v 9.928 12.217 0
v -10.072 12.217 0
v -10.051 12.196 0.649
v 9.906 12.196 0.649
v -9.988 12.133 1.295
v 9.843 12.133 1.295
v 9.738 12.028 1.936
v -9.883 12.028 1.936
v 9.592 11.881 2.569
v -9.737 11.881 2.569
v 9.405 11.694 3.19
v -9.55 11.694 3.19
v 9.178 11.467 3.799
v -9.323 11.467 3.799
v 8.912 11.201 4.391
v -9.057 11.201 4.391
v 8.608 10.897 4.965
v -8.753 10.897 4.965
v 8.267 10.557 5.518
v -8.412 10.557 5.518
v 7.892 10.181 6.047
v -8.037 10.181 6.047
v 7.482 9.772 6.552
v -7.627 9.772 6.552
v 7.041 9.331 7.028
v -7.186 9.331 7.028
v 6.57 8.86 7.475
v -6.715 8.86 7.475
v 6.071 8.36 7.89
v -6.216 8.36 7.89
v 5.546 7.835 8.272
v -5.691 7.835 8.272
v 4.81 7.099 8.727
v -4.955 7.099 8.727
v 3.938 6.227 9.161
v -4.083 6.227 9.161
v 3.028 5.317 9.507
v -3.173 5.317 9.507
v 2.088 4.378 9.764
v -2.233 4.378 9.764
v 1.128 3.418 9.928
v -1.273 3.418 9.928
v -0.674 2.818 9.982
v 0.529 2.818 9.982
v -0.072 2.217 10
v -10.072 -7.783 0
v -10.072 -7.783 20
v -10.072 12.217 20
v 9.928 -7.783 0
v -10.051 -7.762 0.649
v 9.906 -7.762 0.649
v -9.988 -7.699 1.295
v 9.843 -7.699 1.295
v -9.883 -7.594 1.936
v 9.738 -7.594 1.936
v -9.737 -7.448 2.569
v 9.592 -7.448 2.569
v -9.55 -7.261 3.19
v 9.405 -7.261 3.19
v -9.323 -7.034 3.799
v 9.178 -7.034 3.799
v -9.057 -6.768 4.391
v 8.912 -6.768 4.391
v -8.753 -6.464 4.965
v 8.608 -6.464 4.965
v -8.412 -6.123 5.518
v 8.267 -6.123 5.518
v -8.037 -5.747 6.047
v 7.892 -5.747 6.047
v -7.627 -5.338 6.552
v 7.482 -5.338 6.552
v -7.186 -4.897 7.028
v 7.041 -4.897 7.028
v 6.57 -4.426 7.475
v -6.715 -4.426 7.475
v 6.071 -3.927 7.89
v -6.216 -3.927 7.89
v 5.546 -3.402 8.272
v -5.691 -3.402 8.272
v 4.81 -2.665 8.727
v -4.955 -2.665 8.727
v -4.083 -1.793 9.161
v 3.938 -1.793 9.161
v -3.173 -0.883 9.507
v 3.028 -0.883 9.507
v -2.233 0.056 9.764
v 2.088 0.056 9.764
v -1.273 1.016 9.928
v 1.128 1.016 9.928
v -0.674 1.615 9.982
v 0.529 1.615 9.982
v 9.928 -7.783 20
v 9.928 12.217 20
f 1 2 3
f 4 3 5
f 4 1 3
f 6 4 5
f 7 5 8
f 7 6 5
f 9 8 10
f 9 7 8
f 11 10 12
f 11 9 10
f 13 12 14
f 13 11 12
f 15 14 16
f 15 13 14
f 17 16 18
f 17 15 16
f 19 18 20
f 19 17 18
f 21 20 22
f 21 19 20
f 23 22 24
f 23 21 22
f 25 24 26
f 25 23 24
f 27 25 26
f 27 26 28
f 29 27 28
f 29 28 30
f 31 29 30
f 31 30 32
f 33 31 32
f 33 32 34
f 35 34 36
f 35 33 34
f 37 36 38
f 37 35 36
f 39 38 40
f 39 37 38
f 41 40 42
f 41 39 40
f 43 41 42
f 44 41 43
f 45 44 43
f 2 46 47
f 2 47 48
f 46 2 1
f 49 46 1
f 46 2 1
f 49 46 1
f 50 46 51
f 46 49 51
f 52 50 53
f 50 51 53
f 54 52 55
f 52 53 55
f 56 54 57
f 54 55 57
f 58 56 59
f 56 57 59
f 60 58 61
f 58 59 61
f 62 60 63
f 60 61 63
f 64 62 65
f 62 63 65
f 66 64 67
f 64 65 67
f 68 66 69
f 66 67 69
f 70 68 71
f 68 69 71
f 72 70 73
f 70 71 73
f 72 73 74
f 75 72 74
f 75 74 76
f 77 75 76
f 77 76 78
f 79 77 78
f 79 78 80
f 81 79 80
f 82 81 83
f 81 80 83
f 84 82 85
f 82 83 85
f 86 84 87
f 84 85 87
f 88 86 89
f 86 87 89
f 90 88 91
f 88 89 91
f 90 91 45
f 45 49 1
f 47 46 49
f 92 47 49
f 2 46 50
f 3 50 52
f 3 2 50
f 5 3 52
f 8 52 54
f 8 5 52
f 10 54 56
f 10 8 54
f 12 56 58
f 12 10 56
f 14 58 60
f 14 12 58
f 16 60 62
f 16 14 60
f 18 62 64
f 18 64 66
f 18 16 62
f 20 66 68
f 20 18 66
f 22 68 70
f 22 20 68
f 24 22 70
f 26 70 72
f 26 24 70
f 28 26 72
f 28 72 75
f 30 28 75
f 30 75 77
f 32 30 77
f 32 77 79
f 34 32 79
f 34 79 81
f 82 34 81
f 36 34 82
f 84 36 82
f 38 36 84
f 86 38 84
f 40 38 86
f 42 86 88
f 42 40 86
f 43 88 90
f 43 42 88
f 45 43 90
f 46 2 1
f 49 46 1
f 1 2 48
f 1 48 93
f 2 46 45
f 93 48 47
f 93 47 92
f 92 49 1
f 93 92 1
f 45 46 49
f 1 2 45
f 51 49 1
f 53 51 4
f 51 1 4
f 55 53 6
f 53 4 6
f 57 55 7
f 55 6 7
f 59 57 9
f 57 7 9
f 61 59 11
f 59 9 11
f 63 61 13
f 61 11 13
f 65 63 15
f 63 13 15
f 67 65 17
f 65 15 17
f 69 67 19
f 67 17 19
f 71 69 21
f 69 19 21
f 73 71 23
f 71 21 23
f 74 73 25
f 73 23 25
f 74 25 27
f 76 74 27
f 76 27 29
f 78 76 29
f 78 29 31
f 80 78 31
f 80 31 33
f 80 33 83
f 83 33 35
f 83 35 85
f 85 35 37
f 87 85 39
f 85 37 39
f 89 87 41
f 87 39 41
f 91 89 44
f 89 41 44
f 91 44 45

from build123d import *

# Parameters (mm, degrees)
F0_W     = 20
F0_H     = 20
F1_DEPTH = 20
F2_DEPTH = 10
F3_SIZE  = 9.99999
F4_DEPTH = 10
F5_R     = 9.99999


# Not quite as in the source:
# - a fillet or chamfer is up to 0.001 mm smaller than in the source, because OpenCascade refuses the exact size


with BuildPart() as f1:
    # F0 (on Top) → F1 (new body)
    with BuildSketch(Plane.XY):
        with Locations((-0.0724839047, 2.2167936491)):
            Rectangle(F0_W, F0_H)
    extrude(amount=F1_DEPTH)


with BuildPart() as f2:
    # F0 (on Top) → F2 (new body)
    with BuildSketch(Plane.XY):
        with Locations((-0.0724839047, 2.2167936491)):
            Rectangle(F0_W, F0_H)
    extrude(amount=F2_DEPTH)

    # F3 (size 10 in the source; OpenCascade refuses exactly that, so slightly less here)
    f3_edges = [f2.edges().sort_by_distance(p)[0] for p in [
        (-0.072484, 12.216794, 10),
        (-10.072484, 2.216794, 10),
        (-0.072484, -7.783206, 10),
        (9.927516, 2.216794, 10),
    ]]
    chamfer(f3_edges, length=F3_SIZE)


with BuildPart() as f4:
    # F0 (on Top) → F4 (new body)
    with BuildSketch(Plane.XY):
        with Locations((-0.0724839047, 2.2167936491)):
            Rectangle(F0_W, F0_H)
    extrude(amount=F4_DEPTH)

    # F5 (radius 10 in the source; OpenCascade refuses exactly that, so slightly less here)
    f5_edges = [f4.edges().sort_by_distance(p)[0] for p in [
        (-0.072484, 12.216794, 10),
        (-10.072484, 2.216794, 10),
        (-0.072484, -7.783206, 10),
        (9.927516, 2.216794, 10),
    ]]
    fillet(f5_edges, radius=F5_R)


solid = Compound([f1.part, f2.part, f4.part])
